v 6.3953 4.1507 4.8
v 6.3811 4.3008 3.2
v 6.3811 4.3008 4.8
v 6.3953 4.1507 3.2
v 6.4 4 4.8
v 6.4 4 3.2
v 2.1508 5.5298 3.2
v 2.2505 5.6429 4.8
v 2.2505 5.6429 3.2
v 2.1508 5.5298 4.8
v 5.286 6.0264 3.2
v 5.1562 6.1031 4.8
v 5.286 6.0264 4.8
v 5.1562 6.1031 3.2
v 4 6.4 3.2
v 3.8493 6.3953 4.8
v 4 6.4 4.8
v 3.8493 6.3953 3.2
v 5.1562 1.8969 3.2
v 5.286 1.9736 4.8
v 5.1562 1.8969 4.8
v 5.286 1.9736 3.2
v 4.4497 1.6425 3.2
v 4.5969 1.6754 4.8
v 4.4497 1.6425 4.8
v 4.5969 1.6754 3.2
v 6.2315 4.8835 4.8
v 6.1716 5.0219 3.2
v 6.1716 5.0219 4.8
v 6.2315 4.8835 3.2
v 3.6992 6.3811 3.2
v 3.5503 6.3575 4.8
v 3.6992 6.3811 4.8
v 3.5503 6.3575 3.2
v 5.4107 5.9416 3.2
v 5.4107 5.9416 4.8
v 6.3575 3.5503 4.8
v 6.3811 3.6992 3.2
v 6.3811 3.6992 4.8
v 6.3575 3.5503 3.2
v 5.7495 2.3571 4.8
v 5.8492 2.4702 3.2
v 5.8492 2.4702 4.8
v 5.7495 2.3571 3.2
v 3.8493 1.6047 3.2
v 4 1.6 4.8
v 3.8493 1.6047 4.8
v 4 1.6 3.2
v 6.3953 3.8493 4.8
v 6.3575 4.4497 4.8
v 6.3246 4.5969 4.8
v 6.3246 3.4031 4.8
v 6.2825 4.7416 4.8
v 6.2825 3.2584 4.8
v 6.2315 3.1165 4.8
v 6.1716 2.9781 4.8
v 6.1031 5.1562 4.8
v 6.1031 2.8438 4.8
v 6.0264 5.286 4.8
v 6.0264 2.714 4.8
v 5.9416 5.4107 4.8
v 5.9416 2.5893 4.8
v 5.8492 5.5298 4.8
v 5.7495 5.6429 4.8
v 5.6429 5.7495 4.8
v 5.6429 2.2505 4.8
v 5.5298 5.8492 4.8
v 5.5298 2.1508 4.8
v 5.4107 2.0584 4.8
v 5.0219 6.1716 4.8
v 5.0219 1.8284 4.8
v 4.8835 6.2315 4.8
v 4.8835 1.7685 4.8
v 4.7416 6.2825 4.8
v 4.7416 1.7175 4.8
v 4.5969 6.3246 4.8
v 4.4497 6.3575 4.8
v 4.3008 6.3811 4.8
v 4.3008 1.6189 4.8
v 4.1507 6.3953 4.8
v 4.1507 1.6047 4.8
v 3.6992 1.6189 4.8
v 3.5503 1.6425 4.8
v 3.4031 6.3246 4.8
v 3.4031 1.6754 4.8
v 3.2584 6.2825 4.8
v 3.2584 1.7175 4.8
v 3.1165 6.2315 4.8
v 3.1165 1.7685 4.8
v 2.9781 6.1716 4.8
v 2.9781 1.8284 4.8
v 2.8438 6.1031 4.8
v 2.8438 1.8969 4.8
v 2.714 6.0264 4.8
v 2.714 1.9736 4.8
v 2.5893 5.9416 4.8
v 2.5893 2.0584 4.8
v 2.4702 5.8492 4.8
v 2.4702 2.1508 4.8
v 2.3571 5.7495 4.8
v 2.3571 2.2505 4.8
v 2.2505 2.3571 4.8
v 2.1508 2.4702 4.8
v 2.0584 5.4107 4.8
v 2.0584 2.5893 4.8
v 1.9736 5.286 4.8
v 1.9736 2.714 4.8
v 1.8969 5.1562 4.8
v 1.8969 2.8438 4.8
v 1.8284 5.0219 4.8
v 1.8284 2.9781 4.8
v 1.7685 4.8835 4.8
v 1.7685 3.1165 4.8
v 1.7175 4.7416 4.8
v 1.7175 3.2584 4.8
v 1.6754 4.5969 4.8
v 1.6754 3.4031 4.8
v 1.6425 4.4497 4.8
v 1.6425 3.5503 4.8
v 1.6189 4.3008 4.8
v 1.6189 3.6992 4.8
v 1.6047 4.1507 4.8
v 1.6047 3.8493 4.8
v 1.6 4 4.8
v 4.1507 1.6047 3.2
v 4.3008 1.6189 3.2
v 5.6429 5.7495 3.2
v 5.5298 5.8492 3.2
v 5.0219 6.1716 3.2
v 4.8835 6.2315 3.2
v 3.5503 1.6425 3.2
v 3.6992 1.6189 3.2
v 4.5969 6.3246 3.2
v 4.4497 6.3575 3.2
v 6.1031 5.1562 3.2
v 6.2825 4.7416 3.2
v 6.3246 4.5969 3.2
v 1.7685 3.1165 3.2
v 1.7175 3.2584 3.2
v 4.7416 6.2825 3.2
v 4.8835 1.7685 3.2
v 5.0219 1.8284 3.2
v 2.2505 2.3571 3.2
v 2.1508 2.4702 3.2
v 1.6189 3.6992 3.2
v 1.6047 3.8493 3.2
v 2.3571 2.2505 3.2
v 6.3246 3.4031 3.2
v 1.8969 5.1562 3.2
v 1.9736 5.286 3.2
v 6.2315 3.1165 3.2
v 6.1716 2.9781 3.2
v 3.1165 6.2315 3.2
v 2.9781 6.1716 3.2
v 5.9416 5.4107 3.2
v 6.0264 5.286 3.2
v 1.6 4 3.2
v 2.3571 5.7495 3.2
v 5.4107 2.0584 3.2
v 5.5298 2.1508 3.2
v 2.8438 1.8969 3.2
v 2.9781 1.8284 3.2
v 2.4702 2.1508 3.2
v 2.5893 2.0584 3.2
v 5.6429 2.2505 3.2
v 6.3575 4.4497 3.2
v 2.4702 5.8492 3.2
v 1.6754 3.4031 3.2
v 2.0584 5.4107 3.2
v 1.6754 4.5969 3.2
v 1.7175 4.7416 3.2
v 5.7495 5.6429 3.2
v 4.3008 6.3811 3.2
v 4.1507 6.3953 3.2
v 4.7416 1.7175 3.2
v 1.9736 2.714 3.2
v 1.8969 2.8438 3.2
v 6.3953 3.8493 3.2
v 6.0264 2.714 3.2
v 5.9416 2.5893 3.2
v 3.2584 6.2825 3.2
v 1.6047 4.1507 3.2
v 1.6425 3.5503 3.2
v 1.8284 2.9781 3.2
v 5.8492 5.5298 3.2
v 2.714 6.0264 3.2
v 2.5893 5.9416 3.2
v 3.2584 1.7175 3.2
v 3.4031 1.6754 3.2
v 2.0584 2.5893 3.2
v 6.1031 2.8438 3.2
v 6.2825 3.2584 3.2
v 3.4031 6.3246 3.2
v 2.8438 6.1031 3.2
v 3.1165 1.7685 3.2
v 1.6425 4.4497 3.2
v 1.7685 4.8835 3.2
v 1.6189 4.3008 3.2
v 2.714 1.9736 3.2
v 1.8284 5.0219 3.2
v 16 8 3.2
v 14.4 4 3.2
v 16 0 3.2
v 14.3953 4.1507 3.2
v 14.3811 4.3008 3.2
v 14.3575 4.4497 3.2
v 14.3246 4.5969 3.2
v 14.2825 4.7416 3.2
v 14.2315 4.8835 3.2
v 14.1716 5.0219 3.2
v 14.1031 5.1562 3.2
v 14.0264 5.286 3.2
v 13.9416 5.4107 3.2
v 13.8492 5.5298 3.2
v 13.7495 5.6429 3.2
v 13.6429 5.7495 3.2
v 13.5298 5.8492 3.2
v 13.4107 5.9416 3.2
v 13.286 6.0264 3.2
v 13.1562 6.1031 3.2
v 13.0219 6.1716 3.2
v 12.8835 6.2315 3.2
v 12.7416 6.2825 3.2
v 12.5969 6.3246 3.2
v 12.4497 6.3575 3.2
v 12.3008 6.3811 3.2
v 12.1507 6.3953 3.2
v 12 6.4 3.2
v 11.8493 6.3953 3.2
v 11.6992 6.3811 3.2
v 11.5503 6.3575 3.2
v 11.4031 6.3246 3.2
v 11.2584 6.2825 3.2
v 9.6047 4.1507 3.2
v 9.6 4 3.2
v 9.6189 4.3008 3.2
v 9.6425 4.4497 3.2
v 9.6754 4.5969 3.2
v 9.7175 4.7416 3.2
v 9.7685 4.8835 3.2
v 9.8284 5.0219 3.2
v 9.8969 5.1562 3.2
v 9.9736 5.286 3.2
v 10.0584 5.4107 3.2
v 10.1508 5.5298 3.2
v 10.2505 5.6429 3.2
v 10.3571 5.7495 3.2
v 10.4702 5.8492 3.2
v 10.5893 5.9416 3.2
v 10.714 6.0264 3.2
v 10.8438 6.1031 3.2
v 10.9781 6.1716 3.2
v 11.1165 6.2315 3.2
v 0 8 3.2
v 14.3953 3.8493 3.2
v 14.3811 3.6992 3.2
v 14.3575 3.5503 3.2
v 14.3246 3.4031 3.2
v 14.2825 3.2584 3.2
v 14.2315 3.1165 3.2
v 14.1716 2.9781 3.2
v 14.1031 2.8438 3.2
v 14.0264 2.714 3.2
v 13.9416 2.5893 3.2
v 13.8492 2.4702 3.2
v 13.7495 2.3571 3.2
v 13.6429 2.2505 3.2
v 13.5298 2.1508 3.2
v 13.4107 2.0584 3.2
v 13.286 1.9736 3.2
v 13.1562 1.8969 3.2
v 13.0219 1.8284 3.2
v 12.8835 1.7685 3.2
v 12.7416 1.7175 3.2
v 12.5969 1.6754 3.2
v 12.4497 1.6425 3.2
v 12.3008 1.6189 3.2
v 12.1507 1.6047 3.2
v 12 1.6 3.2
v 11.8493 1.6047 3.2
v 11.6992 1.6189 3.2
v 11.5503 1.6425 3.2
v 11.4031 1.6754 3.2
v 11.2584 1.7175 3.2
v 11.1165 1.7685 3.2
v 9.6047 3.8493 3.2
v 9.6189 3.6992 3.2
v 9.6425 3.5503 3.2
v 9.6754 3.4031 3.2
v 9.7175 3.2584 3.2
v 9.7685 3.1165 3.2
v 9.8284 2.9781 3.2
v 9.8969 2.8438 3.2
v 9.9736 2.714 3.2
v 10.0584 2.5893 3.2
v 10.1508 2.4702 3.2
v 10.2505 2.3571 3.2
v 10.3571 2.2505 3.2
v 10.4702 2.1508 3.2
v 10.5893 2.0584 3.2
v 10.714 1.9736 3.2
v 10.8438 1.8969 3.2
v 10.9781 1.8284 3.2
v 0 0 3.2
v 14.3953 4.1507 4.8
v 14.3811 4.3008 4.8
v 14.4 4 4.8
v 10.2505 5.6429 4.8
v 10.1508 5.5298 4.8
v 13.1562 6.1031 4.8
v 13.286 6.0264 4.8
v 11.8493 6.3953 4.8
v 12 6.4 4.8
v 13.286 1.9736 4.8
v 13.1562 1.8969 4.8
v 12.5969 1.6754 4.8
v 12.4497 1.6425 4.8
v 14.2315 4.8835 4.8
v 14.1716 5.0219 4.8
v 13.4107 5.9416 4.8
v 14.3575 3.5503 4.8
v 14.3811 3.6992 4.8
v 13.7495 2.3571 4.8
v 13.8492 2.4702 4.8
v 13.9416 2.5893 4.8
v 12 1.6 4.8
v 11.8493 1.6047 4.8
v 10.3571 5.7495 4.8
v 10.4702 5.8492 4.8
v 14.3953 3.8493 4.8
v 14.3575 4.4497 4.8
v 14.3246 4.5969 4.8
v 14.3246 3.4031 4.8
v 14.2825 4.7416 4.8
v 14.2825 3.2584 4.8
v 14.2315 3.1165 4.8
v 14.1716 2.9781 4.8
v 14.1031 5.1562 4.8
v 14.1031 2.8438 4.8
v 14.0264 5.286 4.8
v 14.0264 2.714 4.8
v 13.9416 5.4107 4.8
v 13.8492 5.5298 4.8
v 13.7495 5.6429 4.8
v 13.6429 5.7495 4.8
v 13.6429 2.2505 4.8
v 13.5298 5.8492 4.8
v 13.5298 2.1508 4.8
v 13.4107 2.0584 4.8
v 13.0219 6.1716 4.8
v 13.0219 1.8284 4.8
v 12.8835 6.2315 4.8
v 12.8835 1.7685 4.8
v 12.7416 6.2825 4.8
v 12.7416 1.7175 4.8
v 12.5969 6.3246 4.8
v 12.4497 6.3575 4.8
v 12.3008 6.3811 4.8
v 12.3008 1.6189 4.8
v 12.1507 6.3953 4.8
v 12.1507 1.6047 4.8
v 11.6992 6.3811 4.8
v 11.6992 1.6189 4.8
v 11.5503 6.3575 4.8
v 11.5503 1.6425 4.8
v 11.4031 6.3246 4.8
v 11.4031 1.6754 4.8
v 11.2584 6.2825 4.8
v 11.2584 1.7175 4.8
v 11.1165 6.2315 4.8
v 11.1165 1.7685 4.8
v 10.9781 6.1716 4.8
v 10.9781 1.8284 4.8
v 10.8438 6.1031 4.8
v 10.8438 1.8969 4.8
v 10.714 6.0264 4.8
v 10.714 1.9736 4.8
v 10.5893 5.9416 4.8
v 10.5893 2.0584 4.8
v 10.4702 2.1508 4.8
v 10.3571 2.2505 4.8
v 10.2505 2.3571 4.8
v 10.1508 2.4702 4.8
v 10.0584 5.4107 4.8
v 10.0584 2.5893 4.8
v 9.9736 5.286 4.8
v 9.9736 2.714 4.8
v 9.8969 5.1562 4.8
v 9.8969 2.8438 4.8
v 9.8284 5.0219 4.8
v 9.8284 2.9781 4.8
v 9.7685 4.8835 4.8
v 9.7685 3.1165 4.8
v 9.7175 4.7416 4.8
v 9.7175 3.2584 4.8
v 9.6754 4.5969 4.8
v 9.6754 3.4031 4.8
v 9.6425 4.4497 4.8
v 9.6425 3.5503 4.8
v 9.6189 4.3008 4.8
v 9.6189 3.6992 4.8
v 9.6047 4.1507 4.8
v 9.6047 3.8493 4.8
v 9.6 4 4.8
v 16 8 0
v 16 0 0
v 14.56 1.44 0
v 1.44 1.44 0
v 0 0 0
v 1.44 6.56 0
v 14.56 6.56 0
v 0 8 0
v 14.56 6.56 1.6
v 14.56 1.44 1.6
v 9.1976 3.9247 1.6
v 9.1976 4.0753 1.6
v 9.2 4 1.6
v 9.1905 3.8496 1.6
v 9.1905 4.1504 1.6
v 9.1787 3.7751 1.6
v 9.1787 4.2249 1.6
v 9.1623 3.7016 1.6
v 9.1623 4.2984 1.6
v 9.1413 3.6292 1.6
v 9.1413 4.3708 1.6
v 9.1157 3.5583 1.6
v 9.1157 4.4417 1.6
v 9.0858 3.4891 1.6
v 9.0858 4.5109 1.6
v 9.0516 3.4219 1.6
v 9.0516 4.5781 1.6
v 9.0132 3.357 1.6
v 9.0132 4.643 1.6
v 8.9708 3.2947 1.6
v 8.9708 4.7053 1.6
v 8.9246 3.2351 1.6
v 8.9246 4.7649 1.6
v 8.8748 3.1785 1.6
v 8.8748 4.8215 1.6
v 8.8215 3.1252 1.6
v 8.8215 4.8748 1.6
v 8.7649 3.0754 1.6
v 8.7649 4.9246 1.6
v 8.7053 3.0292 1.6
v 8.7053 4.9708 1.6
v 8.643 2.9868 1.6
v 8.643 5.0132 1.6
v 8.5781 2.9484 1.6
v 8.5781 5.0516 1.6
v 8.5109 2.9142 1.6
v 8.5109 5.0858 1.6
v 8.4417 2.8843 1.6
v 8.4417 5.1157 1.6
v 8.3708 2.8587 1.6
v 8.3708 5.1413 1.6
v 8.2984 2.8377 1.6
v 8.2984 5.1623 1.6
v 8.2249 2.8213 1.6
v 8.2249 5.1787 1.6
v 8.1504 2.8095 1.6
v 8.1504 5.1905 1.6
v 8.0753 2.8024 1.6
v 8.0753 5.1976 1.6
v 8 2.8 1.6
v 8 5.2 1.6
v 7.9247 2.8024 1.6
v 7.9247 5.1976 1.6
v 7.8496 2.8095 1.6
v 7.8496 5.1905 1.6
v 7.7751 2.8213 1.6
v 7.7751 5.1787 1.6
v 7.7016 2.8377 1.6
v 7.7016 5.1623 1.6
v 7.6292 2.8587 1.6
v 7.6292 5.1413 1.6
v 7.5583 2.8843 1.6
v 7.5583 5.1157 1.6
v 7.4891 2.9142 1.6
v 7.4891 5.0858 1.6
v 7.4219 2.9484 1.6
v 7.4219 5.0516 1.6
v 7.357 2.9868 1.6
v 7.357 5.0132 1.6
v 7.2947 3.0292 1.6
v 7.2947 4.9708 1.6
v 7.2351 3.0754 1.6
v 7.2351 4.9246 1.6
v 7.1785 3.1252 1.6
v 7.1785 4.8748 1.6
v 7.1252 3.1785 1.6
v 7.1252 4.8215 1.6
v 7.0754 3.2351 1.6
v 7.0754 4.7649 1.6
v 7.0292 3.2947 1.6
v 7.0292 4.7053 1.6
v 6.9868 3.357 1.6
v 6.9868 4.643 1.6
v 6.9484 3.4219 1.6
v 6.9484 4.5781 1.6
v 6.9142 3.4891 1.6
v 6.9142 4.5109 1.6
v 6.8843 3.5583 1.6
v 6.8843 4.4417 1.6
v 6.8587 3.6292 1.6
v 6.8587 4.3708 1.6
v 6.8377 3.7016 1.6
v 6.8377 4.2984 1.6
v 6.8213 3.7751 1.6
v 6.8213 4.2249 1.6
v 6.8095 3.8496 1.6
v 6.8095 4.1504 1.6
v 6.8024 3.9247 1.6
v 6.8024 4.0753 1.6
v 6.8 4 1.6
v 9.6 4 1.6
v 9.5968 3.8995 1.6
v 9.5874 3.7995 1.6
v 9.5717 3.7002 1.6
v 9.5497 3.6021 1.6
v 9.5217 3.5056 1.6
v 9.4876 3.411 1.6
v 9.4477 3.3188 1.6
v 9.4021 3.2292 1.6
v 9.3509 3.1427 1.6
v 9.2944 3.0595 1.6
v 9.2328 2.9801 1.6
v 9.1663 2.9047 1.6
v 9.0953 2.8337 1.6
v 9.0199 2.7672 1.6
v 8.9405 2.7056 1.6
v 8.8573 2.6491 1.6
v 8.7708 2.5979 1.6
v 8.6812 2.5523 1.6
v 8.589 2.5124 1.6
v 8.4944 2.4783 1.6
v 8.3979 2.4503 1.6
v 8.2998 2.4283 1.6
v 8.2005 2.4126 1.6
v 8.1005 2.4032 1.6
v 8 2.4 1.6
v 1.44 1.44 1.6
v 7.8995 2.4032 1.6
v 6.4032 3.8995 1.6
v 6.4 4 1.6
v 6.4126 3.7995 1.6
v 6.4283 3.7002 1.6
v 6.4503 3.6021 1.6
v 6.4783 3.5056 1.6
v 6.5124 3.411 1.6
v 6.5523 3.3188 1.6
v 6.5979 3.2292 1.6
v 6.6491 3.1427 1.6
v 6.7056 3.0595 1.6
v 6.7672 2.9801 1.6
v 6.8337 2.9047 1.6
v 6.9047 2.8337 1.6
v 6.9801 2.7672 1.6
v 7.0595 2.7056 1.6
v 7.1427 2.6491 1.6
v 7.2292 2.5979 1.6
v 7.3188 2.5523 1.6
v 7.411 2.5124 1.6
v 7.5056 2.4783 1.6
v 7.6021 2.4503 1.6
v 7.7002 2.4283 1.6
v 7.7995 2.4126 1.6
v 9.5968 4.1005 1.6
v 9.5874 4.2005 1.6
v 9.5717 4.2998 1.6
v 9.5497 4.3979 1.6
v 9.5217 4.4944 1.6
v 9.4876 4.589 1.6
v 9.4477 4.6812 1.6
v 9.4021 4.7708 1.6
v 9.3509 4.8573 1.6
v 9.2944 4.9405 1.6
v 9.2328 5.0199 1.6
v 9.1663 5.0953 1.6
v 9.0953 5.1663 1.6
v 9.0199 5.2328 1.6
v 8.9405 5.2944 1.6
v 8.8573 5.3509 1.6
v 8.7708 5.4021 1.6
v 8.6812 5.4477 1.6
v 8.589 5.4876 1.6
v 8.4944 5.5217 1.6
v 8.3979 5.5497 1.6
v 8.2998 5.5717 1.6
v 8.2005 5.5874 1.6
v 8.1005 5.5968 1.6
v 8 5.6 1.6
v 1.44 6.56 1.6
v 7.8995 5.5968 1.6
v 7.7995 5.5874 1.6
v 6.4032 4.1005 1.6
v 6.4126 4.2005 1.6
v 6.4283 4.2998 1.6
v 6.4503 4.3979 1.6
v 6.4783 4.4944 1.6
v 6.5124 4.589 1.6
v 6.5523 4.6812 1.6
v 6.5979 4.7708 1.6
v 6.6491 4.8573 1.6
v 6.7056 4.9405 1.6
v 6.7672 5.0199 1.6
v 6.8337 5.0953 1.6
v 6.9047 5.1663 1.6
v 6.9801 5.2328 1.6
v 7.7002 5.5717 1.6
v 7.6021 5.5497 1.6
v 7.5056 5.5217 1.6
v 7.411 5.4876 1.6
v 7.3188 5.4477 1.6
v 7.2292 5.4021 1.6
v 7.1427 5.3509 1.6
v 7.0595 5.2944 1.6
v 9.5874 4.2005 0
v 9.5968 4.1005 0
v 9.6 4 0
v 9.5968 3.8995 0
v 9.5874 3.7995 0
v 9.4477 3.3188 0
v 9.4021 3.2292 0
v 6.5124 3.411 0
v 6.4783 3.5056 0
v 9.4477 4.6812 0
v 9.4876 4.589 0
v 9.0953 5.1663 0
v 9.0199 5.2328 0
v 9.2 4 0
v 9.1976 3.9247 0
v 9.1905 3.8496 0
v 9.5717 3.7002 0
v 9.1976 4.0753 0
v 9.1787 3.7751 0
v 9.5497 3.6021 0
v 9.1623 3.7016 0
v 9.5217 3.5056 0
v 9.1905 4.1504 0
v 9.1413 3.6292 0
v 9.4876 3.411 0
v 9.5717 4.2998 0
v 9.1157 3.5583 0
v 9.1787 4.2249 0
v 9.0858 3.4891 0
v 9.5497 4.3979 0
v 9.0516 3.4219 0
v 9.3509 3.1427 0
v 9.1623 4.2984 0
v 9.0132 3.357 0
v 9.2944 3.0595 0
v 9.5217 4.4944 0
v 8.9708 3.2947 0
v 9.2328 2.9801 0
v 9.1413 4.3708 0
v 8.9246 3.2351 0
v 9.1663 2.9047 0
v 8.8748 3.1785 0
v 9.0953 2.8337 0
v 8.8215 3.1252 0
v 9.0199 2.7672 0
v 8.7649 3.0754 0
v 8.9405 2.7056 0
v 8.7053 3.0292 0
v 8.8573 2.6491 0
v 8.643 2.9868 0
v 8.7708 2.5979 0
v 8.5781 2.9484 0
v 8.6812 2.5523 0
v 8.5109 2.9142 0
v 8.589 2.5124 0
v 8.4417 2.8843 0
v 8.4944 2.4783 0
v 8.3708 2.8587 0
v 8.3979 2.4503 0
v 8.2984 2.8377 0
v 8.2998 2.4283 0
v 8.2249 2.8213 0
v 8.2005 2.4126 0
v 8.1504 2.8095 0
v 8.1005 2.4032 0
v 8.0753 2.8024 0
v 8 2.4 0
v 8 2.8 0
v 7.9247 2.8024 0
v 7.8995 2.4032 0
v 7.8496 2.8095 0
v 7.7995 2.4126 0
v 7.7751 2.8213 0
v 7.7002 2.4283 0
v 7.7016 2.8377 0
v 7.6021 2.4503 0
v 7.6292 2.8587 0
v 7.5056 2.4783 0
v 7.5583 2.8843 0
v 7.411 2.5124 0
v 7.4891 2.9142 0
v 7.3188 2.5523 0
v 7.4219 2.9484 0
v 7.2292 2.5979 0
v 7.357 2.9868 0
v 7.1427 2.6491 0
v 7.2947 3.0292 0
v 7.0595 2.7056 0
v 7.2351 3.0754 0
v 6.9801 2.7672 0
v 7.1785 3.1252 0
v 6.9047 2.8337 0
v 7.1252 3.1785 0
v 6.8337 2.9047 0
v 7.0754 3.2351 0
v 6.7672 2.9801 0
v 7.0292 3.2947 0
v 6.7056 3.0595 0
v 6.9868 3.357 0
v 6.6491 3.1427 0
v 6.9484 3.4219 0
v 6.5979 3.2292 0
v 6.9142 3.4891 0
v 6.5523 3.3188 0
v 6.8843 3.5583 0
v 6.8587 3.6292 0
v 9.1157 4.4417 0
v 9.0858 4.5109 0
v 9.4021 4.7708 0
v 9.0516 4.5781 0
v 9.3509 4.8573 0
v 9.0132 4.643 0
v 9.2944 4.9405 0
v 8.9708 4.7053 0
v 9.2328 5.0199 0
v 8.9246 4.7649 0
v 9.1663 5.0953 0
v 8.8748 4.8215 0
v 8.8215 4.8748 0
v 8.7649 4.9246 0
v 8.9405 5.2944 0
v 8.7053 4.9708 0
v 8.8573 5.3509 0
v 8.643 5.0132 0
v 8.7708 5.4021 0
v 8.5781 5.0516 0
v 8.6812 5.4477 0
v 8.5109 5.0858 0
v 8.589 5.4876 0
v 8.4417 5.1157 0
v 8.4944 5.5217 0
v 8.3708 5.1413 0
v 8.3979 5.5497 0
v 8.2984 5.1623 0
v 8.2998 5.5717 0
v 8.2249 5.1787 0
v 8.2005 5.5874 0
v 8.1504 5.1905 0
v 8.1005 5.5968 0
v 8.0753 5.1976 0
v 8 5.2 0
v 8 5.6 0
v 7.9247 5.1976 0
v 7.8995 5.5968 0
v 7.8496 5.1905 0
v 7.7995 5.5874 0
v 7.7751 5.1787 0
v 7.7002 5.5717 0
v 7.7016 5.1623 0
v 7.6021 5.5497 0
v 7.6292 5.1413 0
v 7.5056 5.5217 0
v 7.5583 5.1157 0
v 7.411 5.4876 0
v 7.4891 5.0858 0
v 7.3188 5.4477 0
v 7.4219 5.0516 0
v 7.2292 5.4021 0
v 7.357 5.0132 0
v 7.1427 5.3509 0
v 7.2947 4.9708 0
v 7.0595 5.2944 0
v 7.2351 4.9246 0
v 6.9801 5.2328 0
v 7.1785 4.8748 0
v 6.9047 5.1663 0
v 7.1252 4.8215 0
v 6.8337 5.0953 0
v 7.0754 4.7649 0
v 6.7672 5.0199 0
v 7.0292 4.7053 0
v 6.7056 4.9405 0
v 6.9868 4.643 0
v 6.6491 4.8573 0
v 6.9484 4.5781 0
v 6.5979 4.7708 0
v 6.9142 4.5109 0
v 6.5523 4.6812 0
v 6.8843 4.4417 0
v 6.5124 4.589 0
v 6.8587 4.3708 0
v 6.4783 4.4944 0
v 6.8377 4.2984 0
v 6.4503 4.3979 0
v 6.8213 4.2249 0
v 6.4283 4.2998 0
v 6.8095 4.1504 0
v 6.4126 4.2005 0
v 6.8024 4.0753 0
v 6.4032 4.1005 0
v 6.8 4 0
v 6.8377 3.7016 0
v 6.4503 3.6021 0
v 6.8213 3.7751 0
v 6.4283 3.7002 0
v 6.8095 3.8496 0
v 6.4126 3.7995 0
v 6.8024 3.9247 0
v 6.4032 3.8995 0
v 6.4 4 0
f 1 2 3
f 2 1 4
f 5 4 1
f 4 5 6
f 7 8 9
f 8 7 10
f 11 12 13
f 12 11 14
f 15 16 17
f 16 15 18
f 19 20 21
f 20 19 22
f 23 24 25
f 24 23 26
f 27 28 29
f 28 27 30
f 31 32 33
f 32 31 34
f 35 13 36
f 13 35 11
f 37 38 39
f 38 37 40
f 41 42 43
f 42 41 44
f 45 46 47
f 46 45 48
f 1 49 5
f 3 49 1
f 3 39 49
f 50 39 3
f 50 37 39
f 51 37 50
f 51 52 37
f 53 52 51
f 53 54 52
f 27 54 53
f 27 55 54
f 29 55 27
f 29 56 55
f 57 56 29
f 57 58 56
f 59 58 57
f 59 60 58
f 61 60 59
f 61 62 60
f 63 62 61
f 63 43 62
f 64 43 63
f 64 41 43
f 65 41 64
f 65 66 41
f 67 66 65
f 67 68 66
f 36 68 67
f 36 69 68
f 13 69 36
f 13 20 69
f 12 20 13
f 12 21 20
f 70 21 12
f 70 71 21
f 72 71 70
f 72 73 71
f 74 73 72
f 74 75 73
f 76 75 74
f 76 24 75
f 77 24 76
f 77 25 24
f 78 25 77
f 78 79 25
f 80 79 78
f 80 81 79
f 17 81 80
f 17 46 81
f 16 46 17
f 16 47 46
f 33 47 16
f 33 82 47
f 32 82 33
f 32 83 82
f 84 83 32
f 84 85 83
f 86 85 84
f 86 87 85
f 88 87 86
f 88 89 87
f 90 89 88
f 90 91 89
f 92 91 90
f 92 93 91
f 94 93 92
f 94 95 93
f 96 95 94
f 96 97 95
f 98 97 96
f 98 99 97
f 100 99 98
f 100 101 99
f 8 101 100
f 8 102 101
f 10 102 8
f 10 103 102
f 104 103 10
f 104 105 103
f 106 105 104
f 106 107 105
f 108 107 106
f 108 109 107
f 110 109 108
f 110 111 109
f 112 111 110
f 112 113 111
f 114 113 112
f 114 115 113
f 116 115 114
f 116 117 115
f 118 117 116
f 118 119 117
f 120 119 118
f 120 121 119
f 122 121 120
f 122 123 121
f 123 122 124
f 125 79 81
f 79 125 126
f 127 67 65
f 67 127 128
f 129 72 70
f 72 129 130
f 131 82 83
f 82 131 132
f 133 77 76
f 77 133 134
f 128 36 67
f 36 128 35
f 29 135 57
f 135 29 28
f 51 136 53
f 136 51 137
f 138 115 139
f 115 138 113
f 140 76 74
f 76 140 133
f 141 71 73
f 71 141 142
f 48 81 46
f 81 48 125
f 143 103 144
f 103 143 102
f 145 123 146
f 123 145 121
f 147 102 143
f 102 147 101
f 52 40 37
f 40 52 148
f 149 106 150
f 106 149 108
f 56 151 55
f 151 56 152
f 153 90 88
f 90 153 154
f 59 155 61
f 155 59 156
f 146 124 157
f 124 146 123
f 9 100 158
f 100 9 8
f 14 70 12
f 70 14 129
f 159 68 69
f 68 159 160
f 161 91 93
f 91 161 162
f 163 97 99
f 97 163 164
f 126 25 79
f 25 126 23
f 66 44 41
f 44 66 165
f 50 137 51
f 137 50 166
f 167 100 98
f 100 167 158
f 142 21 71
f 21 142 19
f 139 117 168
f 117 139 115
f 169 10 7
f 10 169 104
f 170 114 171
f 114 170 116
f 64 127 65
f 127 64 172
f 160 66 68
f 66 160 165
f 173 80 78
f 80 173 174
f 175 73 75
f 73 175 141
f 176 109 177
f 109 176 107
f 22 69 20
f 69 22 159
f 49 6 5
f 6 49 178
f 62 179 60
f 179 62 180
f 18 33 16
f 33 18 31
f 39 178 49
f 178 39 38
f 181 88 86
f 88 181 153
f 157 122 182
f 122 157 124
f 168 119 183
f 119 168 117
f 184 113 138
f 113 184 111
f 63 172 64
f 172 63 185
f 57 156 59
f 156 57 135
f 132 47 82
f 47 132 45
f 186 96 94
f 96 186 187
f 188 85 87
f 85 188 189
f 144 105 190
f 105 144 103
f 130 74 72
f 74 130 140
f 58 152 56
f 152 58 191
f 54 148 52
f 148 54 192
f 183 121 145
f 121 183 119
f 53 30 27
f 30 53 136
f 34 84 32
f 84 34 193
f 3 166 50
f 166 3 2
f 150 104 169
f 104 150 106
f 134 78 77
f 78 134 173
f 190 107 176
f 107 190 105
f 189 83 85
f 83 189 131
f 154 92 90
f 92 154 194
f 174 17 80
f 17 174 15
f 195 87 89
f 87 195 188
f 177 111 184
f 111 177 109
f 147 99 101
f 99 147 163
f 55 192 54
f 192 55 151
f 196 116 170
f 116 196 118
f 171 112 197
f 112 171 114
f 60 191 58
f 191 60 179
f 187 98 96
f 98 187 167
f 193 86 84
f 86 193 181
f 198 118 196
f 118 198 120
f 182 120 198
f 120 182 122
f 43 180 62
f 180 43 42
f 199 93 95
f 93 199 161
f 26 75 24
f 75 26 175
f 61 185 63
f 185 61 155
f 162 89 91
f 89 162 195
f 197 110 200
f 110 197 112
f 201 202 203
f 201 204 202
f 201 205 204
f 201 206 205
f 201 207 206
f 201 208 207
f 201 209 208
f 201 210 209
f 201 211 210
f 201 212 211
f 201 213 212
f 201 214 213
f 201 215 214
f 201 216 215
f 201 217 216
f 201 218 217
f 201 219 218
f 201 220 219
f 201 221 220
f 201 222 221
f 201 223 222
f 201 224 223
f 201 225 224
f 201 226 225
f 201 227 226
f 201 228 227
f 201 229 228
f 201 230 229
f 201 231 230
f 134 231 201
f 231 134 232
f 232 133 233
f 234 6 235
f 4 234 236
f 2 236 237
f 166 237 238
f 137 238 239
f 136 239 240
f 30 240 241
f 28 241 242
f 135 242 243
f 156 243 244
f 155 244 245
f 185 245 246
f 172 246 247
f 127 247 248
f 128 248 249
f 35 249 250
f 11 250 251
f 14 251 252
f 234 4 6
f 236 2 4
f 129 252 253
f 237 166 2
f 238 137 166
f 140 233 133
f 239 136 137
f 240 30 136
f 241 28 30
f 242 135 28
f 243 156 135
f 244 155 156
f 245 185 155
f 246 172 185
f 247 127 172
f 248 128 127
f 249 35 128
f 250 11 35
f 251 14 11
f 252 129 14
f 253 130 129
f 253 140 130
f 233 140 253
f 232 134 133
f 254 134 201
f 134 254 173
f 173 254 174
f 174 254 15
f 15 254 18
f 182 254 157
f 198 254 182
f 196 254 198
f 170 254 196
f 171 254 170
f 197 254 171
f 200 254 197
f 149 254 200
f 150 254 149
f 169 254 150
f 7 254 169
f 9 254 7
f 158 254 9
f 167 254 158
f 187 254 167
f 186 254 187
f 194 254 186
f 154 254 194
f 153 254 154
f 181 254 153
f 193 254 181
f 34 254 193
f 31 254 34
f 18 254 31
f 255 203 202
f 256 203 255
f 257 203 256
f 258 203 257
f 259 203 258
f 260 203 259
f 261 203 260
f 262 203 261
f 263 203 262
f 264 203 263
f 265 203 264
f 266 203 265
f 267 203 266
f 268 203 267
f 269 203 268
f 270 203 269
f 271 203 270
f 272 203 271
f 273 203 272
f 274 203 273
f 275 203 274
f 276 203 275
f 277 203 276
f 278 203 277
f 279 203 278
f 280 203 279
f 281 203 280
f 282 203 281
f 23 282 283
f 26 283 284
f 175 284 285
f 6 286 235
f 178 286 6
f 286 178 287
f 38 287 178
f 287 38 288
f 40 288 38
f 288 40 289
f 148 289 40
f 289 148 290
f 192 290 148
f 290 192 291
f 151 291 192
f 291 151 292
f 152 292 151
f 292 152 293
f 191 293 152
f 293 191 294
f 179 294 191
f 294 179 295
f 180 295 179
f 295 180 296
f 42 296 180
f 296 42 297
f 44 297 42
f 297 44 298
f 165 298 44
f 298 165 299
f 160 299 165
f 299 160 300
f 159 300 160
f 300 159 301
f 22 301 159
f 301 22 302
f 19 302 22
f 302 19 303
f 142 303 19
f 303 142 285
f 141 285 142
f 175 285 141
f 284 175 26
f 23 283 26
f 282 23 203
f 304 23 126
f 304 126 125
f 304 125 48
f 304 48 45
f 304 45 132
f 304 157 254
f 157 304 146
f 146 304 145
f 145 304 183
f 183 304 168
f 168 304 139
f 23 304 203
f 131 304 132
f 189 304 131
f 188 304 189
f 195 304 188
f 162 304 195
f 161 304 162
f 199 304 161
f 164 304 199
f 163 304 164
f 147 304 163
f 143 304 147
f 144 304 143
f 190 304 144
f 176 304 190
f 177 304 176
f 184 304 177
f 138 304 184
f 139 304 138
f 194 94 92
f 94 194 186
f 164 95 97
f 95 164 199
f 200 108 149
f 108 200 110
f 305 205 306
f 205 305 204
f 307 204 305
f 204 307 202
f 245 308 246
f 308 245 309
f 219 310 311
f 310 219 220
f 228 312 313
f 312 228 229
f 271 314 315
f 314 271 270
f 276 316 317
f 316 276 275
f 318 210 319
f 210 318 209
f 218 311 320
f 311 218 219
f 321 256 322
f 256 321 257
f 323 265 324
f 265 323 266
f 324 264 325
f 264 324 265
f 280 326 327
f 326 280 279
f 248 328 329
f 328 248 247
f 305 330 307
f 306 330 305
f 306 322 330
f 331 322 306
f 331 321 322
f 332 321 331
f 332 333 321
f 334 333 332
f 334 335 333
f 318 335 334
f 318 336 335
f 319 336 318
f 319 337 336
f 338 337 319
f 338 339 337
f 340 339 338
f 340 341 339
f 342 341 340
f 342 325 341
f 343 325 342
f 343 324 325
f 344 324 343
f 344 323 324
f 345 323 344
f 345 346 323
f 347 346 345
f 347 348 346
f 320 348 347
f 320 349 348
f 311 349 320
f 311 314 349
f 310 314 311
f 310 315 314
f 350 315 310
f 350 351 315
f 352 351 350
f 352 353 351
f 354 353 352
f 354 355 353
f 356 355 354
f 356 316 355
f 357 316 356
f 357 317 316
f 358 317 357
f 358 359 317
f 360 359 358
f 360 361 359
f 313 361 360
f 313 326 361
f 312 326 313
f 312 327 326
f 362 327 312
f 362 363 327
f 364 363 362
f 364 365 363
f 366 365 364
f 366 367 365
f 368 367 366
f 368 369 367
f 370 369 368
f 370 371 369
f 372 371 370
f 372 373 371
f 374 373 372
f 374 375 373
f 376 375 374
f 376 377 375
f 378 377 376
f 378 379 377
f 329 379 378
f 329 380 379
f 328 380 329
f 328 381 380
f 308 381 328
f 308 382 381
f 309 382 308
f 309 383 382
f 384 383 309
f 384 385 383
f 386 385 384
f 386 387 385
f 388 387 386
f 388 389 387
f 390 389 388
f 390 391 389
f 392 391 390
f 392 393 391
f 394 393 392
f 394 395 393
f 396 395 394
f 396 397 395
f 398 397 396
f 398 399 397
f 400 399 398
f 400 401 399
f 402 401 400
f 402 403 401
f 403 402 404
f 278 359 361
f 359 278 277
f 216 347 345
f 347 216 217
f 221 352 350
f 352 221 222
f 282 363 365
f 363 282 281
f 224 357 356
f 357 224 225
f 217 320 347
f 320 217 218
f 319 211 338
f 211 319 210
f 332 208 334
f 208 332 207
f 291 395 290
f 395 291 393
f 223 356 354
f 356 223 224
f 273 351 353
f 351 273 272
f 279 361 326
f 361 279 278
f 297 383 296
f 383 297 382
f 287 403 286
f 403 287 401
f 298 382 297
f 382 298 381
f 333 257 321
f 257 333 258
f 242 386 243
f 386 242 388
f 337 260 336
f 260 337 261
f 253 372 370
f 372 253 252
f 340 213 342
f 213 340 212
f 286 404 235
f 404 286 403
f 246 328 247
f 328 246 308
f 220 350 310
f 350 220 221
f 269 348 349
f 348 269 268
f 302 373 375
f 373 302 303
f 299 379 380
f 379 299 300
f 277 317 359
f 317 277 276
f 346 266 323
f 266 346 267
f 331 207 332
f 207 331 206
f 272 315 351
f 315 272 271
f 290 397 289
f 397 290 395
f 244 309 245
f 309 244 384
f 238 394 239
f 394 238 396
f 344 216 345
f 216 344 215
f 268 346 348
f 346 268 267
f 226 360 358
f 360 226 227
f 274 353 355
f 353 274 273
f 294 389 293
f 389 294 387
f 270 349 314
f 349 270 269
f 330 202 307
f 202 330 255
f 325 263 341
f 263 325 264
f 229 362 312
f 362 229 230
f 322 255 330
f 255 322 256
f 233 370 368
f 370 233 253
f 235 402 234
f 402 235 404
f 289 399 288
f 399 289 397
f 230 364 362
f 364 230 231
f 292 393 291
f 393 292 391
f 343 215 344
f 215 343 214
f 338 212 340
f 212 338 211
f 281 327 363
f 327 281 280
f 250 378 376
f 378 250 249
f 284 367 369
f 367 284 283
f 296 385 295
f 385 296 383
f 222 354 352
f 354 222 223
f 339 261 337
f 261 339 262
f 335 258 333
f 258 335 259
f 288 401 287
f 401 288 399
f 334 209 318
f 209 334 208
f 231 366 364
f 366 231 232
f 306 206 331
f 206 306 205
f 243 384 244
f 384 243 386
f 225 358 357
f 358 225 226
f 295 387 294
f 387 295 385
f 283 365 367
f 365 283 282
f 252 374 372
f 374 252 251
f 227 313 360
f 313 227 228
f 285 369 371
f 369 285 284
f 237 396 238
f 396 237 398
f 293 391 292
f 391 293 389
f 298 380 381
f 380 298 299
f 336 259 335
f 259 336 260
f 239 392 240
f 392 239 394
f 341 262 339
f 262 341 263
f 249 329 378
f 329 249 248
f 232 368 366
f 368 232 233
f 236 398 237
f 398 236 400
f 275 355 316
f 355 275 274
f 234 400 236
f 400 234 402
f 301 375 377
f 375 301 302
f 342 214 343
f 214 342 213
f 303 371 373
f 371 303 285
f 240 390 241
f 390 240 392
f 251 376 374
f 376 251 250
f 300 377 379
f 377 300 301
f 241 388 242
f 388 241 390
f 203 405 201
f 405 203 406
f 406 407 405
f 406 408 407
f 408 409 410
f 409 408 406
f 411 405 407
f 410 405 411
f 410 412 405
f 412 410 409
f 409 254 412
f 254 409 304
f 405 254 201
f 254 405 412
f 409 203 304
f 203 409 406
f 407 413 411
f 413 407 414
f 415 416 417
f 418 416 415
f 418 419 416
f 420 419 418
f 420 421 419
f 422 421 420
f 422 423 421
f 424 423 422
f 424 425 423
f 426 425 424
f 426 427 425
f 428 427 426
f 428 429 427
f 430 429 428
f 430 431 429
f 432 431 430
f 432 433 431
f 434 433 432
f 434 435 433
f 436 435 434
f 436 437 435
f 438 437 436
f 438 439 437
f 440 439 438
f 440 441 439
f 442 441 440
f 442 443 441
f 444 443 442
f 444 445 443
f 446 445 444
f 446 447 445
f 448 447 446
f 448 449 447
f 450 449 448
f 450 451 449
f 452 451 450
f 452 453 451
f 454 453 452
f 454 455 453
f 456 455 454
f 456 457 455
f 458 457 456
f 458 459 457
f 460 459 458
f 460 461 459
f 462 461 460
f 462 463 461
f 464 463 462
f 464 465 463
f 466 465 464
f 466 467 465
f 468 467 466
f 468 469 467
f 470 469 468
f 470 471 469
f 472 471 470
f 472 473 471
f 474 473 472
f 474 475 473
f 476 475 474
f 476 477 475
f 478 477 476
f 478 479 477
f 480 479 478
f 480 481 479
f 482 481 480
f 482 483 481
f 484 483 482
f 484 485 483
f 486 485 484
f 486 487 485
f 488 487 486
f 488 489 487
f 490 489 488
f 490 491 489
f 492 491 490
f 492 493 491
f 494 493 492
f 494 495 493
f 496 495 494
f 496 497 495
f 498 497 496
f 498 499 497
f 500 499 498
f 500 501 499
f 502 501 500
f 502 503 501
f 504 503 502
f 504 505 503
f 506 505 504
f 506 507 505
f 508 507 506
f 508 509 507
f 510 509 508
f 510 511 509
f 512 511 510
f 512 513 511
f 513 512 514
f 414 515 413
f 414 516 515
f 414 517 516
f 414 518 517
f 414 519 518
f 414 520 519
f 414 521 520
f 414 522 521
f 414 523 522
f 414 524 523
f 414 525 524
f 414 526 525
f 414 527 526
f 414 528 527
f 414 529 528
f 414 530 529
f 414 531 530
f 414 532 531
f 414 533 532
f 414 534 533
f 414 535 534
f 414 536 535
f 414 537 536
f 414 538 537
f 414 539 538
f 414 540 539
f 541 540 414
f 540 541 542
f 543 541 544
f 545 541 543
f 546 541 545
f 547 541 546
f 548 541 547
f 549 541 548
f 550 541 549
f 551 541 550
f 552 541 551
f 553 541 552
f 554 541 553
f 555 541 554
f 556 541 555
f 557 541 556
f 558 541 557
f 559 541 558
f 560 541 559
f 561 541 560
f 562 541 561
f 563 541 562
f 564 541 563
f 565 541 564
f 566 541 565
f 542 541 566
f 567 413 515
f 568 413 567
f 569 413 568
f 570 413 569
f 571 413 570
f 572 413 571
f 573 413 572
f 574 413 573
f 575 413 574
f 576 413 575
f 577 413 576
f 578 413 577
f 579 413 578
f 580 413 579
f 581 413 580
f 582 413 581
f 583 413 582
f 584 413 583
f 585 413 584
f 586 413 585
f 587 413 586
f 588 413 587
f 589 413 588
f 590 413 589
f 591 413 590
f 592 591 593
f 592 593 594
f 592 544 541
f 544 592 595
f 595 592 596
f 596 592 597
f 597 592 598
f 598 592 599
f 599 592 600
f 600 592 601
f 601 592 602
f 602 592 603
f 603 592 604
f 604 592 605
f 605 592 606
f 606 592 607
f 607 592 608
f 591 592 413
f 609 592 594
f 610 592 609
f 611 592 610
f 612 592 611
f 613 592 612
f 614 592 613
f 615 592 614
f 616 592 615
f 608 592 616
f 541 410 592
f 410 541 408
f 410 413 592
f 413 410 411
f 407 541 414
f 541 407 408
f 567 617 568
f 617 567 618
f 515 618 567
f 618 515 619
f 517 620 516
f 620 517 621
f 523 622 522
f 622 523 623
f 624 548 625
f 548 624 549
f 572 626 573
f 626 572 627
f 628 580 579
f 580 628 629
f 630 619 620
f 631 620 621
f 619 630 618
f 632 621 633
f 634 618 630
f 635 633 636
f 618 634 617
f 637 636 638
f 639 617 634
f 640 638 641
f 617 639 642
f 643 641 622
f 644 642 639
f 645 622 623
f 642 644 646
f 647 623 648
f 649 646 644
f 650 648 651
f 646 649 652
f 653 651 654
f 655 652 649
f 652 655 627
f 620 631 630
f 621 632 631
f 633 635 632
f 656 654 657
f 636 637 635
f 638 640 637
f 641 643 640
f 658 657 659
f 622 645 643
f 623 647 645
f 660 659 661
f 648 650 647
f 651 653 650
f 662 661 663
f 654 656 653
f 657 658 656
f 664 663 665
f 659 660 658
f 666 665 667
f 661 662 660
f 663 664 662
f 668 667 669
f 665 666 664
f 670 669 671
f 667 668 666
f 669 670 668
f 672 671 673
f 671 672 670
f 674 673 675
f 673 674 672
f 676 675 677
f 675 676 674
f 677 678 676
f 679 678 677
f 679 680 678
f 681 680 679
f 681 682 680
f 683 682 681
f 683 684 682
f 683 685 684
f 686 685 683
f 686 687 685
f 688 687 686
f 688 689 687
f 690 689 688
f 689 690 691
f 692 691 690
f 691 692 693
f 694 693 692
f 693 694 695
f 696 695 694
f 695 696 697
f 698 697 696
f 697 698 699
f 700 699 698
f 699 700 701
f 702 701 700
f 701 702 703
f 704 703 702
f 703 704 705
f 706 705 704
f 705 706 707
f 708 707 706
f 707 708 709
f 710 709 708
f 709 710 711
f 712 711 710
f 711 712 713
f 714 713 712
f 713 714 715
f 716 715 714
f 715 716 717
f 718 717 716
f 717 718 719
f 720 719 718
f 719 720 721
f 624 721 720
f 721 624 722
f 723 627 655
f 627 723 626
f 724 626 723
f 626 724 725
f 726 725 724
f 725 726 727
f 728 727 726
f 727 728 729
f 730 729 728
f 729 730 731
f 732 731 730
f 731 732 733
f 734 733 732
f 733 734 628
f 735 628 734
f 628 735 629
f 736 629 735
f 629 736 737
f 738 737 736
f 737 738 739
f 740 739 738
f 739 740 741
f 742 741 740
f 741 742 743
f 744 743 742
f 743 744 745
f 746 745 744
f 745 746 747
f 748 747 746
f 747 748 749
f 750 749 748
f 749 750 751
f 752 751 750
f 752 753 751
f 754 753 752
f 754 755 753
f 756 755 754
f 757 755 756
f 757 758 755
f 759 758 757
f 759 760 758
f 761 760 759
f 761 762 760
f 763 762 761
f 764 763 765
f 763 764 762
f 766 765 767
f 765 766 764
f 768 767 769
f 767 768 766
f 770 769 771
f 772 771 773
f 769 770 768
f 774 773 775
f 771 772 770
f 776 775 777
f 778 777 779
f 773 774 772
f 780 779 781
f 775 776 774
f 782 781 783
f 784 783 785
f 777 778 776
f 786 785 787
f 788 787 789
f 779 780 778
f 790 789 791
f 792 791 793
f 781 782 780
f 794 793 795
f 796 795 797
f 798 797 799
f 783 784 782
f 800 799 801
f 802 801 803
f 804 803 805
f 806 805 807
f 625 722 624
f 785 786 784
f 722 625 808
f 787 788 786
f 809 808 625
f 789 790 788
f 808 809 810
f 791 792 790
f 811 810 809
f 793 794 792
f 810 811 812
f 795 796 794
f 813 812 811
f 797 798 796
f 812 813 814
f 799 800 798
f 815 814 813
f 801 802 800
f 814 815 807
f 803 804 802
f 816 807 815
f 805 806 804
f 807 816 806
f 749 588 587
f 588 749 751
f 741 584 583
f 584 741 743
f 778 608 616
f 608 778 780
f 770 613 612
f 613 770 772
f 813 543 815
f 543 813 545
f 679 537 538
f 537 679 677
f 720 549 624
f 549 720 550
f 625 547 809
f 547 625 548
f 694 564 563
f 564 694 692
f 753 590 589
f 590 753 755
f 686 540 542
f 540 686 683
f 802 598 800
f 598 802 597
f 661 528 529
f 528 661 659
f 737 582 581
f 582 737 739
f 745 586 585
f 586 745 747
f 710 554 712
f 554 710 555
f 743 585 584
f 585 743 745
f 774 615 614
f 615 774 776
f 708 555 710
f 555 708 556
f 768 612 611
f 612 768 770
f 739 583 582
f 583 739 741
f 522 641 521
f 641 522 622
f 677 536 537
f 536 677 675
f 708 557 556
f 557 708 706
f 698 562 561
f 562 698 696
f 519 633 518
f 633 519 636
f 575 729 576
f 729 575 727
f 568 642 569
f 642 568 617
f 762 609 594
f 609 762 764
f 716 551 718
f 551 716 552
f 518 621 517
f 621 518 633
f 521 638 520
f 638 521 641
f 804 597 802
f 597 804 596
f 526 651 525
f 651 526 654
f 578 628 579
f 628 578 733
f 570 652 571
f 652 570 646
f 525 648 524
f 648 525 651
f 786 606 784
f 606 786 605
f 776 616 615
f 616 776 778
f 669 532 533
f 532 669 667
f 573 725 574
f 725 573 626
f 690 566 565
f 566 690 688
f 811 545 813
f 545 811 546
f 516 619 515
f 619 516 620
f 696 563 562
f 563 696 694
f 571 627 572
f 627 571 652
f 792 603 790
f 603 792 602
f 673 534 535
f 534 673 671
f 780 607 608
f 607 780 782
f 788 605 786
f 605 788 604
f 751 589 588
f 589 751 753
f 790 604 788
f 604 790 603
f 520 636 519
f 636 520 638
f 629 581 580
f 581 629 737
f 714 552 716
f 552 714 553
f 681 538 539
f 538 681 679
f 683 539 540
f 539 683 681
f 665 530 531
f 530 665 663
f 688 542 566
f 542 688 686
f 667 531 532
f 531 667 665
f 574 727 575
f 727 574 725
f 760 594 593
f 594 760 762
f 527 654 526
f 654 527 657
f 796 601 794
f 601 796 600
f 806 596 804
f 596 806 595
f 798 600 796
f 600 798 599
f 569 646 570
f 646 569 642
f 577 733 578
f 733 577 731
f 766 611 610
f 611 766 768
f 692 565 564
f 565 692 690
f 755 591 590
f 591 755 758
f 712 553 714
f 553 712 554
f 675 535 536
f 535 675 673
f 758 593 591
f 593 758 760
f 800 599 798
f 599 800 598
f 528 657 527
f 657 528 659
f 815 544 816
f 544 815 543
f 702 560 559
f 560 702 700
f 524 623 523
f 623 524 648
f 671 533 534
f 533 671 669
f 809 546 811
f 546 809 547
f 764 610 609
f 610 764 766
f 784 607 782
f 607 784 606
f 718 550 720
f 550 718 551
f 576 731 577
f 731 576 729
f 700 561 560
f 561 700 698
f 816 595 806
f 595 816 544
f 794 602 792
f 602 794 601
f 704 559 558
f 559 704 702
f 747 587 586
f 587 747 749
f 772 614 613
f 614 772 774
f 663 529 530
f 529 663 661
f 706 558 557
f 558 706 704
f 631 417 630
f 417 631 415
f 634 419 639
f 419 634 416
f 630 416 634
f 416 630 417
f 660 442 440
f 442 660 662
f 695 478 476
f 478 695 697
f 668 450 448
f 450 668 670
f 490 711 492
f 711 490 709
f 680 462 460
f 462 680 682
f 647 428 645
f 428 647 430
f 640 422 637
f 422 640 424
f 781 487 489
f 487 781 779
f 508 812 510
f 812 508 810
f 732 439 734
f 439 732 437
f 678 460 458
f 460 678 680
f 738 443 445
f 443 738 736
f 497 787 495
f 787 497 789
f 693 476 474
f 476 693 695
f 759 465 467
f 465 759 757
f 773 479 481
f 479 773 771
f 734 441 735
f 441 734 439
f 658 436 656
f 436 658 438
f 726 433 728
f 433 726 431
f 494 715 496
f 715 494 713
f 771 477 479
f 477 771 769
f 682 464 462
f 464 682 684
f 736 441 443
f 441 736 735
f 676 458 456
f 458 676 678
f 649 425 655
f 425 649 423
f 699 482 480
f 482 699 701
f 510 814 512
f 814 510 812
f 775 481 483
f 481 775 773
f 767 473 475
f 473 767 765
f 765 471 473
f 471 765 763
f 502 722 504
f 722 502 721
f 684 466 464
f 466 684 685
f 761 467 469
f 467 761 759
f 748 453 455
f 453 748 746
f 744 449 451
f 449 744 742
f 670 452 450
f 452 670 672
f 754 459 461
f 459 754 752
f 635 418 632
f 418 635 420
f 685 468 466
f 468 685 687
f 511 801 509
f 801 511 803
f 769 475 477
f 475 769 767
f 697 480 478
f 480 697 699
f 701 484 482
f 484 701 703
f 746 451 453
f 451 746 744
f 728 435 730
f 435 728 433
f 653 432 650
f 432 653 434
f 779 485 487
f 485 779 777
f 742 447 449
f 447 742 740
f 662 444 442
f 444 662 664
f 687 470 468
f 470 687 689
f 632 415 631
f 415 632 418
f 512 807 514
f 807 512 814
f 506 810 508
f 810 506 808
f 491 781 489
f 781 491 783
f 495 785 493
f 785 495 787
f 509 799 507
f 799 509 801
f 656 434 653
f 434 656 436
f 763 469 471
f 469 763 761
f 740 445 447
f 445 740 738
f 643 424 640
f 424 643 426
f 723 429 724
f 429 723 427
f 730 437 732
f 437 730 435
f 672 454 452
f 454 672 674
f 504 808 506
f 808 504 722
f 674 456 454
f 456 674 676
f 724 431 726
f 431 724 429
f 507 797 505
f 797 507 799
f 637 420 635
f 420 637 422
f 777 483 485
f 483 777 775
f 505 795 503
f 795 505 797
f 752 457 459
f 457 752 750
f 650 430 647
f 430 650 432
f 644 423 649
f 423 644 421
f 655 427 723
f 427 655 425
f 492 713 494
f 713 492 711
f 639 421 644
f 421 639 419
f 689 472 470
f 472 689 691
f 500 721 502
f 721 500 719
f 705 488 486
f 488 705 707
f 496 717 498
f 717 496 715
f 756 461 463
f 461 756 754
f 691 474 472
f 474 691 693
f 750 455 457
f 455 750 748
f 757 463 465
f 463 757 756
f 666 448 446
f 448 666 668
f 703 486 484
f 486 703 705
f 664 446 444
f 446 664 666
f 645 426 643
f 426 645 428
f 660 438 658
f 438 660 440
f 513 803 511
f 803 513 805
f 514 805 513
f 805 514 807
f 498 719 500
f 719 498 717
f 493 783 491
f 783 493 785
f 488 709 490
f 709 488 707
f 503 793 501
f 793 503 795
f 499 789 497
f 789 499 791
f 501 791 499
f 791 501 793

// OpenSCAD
/*
Create standard height 1-by LEGO bricks suitable for 3D printing and use with official LEGO bricks.

Set the WIDTH to the desired size and adjust the tolerance to your printer.
*/

WIDTH = 2;  // Width of lego brick in segments
T = 0.1;    // Tolerance: a higher tolerance gives a looser fit between bricks. A tolerance of 0 is a perfect copy, but doesn't work well with a 3D-printed brick.

u = 1.6;    // One LEGO unit = 1.6mm
function u(i) = i * u;  // Convert LEGO units to mm

if (WIDTH > 0){
    difference(){   // Remove the empty space from under the brick
        union(){    // Add the nubs to the top of the brick
            cube([u(WIDTH * 5), u(5), u(2)]);  // Base brick
            for (i = [0 : WIDTH - 1]){
                translate([u(2.5 + (5 * i)), u(2.5), u(2)]){
                    cylinder(d=u(3), h=u(1), $fn=100);  // Nubs on top
                }
            }
        }
        translate([u(1 - T), u(1 - T), 0]){
            cube([u(5 * WIDTH - 2 + 2*T), u(3 + 2*T), u(1)]);   // Empty space under brick
        }
    }

    if (WIDTH >= 2){
        for (i = [0 : WIDTH - 2]){
            translate([u(5 + (5 * i)), u(2.5), 0]){
                difference(){
                    cylinder(d=u(2), h=u(1), $fn=100);    // Create the inside nub
                    cylinder(d=u(1.5), h=u(1), $fn=100);  // Hollow it out
                }
            }
        }
    }
}
